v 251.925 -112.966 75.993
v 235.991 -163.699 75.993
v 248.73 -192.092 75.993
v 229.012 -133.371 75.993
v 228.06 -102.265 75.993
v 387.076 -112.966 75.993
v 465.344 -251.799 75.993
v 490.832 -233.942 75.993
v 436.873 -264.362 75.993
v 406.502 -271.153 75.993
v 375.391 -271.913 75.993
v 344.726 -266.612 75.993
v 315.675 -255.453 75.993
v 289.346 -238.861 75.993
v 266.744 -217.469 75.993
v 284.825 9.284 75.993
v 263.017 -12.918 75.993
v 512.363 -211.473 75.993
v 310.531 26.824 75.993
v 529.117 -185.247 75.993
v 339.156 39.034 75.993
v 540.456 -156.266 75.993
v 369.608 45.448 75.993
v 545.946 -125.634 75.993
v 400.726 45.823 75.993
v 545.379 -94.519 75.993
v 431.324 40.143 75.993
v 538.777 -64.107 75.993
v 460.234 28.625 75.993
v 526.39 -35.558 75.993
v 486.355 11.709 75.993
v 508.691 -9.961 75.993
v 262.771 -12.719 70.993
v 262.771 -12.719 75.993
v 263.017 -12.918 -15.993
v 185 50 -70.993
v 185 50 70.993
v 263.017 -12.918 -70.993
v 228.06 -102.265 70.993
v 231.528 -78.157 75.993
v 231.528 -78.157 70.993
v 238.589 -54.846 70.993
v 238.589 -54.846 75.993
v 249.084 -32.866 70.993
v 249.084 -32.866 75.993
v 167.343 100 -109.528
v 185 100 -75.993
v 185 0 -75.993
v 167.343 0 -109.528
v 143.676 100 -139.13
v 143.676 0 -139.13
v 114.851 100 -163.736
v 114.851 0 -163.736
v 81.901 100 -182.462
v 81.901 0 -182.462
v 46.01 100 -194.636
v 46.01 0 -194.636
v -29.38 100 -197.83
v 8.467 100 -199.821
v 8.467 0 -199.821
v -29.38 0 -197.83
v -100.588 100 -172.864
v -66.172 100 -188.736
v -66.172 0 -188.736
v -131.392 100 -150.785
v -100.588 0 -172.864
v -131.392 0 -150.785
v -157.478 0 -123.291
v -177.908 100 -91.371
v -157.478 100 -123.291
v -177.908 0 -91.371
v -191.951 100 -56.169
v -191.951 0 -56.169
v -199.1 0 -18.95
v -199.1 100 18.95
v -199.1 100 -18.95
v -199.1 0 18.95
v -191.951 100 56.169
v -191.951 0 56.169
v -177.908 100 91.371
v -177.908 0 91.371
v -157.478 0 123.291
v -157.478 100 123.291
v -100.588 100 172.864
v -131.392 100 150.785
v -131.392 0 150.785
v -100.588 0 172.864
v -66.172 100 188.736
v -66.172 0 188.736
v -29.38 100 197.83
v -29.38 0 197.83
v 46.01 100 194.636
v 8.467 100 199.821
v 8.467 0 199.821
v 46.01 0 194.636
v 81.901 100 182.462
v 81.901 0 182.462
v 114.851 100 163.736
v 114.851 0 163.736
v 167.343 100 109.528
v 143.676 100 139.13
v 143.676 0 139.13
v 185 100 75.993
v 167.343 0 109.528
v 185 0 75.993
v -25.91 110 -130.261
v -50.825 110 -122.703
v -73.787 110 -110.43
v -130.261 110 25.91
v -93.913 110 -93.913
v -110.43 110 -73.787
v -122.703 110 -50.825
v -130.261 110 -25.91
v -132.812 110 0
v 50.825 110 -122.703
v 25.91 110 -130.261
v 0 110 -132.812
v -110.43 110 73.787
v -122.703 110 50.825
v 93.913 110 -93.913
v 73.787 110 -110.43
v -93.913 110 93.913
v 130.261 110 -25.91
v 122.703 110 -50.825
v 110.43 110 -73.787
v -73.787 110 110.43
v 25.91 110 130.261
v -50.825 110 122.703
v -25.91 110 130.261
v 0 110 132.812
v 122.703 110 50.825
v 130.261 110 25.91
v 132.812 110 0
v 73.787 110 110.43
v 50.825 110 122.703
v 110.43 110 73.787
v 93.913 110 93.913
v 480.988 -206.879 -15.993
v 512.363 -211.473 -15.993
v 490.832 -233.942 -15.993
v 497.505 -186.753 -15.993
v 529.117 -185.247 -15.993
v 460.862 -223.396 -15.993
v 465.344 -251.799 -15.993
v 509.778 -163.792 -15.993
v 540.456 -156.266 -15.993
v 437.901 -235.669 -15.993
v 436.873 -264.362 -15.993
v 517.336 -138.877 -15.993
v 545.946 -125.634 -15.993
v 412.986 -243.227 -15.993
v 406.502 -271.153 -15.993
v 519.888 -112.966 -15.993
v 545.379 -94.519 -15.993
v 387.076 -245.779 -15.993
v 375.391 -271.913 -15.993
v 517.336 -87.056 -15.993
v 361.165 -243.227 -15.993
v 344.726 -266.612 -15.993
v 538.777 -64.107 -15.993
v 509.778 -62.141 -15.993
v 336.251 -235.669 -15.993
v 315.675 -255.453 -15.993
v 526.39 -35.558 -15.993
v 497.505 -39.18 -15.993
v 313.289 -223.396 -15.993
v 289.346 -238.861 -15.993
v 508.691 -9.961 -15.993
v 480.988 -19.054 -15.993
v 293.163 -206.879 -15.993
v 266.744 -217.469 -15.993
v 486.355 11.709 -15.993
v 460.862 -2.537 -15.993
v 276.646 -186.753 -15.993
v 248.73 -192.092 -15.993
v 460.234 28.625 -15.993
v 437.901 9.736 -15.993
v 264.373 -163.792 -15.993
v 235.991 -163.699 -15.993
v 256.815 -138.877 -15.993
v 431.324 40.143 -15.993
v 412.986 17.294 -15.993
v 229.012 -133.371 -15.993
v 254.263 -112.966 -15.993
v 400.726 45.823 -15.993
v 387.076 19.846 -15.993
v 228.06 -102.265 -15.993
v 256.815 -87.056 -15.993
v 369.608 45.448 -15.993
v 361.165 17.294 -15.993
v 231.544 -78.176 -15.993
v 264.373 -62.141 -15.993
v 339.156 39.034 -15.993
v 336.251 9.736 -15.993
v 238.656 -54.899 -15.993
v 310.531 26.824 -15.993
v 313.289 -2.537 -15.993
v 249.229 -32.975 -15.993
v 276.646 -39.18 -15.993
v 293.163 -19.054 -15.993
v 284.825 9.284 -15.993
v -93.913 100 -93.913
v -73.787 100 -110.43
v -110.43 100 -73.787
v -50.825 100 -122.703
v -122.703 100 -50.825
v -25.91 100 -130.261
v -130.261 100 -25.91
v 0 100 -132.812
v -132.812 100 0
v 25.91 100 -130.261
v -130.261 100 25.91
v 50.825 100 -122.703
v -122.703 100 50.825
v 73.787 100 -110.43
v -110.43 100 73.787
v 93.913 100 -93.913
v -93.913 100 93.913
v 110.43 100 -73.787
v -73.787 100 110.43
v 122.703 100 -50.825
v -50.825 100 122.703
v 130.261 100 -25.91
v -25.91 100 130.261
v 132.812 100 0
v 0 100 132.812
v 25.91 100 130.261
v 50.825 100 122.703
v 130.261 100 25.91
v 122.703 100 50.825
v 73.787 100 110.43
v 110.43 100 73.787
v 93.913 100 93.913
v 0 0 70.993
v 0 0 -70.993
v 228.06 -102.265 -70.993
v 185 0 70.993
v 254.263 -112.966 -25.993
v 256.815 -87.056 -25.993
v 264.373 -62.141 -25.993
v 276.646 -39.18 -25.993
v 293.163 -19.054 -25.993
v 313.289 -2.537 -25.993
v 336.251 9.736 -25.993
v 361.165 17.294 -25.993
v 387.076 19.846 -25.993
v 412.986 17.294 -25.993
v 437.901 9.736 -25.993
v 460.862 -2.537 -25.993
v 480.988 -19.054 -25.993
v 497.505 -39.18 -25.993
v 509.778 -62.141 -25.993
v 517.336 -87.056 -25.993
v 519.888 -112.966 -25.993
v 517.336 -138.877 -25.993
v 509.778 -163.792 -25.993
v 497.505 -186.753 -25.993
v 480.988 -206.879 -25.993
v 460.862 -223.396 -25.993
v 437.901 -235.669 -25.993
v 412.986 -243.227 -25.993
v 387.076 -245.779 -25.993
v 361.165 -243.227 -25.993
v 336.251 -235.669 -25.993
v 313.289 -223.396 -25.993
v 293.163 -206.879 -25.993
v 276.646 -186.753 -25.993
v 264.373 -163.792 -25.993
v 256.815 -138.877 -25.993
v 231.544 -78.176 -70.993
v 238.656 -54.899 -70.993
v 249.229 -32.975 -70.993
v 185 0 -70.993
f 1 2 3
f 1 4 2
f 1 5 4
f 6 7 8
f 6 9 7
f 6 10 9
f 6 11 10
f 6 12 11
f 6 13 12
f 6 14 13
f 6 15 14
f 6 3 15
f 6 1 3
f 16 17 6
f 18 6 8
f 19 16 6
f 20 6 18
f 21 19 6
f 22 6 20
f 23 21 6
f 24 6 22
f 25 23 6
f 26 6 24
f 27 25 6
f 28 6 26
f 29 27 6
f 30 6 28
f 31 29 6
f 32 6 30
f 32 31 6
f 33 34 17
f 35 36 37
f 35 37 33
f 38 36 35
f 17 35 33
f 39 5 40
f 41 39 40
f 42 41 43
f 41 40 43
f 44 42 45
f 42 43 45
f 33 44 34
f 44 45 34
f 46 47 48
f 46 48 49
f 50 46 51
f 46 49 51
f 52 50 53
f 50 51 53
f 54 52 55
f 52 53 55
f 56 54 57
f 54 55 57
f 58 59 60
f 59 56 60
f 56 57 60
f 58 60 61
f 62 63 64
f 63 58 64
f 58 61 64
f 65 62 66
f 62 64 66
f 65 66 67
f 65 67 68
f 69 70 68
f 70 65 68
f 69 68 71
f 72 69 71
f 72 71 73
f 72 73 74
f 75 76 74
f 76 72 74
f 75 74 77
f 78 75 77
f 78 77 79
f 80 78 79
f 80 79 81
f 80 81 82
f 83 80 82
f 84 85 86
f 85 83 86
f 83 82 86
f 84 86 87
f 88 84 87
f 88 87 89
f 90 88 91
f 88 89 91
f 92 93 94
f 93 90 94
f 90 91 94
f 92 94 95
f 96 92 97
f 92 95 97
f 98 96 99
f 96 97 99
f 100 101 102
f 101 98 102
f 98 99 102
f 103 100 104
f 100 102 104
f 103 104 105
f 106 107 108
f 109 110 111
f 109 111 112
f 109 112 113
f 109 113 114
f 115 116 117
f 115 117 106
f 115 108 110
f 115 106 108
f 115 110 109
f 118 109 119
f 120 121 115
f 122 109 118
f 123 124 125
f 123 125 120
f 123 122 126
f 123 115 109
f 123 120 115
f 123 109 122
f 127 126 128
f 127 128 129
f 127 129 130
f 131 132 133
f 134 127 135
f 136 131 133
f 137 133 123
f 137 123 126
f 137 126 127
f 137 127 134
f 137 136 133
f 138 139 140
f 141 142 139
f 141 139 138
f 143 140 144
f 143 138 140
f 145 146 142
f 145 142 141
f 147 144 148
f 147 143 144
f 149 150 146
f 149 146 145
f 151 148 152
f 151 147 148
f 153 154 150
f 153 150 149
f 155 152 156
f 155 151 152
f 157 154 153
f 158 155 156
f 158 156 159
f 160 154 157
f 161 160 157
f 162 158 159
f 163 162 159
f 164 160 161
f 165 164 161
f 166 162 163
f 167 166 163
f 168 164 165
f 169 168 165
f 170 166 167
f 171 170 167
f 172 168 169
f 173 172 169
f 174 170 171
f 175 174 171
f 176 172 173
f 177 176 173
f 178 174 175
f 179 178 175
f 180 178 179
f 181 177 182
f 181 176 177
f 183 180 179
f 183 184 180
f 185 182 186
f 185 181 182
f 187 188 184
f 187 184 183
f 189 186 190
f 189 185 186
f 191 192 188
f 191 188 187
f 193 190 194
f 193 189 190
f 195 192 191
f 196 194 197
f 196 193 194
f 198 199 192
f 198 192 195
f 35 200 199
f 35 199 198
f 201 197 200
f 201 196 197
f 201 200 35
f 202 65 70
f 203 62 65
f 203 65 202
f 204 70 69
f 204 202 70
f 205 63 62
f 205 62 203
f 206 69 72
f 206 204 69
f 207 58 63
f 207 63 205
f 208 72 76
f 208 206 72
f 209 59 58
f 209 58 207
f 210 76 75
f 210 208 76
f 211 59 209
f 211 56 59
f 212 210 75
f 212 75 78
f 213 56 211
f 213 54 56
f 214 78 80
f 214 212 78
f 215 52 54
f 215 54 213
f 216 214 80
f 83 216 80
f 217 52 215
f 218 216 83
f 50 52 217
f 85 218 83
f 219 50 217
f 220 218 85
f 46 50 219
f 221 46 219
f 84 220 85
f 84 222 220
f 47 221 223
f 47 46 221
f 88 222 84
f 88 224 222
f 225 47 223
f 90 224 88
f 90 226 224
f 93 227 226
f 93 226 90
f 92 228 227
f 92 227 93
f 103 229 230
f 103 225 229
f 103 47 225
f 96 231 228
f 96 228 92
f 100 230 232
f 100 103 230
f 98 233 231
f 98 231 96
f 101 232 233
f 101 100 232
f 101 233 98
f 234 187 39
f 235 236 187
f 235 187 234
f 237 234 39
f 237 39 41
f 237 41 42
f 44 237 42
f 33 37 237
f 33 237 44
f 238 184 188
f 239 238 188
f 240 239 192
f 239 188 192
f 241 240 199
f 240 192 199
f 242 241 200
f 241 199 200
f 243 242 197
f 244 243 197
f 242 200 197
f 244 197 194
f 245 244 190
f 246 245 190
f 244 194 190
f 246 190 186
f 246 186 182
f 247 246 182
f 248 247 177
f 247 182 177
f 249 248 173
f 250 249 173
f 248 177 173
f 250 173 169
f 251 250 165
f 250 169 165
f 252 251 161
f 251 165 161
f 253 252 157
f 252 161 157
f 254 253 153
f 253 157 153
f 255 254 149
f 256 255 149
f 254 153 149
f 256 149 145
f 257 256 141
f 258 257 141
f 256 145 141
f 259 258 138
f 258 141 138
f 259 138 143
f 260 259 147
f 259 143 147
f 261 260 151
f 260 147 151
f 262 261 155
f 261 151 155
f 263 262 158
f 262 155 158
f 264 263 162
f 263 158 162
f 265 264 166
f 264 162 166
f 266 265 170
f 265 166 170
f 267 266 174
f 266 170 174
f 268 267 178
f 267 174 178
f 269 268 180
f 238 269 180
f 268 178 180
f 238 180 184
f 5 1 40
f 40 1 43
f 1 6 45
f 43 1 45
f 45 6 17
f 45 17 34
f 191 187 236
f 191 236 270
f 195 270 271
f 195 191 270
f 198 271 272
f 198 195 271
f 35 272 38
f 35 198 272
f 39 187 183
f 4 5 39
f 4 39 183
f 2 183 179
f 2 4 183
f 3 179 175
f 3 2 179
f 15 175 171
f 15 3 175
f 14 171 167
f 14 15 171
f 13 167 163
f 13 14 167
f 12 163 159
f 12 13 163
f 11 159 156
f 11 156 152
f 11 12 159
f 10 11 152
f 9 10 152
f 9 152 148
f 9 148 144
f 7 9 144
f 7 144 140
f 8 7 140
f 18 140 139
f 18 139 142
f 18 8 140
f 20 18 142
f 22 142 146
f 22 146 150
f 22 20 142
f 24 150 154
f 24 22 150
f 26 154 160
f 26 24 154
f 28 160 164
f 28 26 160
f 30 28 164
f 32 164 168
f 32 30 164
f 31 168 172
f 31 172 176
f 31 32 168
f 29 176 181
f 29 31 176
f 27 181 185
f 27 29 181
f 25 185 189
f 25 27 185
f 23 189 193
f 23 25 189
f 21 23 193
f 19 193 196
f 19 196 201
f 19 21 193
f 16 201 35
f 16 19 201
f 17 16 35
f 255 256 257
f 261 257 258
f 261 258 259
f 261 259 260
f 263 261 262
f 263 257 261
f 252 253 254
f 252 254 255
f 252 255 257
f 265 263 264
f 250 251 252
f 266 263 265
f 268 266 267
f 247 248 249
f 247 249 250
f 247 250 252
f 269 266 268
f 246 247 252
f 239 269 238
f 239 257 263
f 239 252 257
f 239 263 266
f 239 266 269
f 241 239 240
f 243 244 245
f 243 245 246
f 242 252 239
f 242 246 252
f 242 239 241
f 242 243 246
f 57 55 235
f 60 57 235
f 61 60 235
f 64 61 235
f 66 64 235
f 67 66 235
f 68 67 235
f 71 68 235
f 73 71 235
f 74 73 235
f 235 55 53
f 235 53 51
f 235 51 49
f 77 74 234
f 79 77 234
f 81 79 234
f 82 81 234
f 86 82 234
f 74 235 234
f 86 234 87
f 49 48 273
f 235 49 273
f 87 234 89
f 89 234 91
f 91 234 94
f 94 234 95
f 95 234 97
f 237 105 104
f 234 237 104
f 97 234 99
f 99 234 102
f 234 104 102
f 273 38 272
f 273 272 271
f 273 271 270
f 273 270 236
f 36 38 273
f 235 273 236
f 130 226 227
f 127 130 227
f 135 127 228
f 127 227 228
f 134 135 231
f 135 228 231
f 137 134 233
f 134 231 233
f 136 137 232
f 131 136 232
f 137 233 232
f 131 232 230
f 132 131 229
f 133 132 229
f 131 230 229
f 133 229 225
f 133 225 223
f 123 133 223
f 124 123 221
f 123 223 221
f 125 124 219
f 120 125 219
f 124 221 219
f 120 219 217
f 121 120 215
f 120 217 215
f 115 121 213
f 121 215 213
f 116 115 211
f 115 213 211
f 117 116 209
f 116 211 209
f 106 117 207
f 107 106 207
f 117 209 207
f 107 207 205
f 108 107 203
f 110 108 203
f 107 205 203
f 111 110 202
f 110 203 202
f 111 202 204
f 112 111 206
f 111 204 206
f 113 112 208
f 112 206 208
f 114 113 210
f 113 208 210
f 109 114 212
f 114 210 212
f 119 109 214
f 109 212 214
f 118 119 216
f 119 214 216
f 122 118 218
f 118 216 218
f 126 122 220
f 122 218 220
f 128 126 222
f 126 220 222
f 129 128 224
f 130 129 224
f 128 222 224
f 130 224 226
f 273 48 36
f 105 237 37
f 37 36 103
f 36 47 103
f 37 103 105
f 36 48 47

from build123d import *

# Parameters (mm, degrees)
SKETCH1_R           = 200
BOSS_EXTRUDE1_DEPTH = 100
CUT_EXTRUDE2_DEPTH  = 100
BOSS_EXTRUDE2_DEPTH = 75.993421
BOSS_EXTRUDE3_DEPTH = 75.993421
SKETCH9_R           = 159.375
BOSS_EXTRUDE4_DEPTH = 151.986842
CUT_EXTRUDE3_START  = -60
SKETCH11_R          = 159.375
CUT_EXTRUDE3_DEPTH  = 60
CUT_EXTRUDE4_DEPTH  = 5
CUT_EXTRUDE5_DEPTH  = 5
SKETCH15_R          = 132.8125
BOSS_EXTRUDE5_DEPTH = 10
SKETCH16_R          = 132.8125
BOSS_EXTRUDE6_DEPTH = 10


with BuildPart() as part:
    # Sketch1 → Boss-Extrude1 (new body)
    with BuildSketch(Plane(origin=(0, 0, 0), x_dir=(1, 0, 0), z_dir=(0, 1, 0))):
        with Locations(Location((0, 0, 0), (0, 0, 270))):
            Circle(SKETCH1_R)
    extrude(amount=BOSS_EXTRUDE1_DEPTH)

    # Sketch2 → Cut-Extrude2 (cut)
    with BuildSketch(Plane(origin=(0, 100, 0), x_dir=(1, 0, 0), z_dir=(0, 1, 0))):
        Polygon((185, 0), (185, 120.642549135), (200, 120.642549135), (200, 0), (200, -137.849885779), (185, -137.849885779), align=None)
    extrude(amount=-CUT_EXTRUDE2_DEPTH, mode=Mode.SUBTRACT)

    # Sketch4 → Boss-Extrude2 (add)
    with BuildSketch(Plane.XY):
        Polygon((185, 50), (185, 0), (0, 0), (251.924557131, -112.966443103), (387.075695624, -112.966443103), align=None)
    extrude(amount=-BOSS_EXTRUDE2_DEPTH)

    # Sketch7 → Boss-Extrude3 (add)
    with BuildSketch(Plane.XY):
        Polygon((0, 0), (185, 0), (185, 50), (387.075695624, -112.966443103), (251.924557131, -112.966443103), align=None)
    extrude(amount=BOSS_EXTRUDE3_DEPTH)

    # Sketch9 → Boss-Extrude4 (add)
    with BuildSketch(Plane.XY.offset(75.993420768)):
        with Locations((387.075695624, -112.966443103)):
            Circle(SKETCH9_R)
    extrude(amount=-BOSS_EXTRUDE4_DEPTH)

    # Sketch11 → Cut-Extrude3 (cut)
    with BuildSketch(Plane(origin=(0, 0, -75.993420768), x_dir=(-1, 0, 0), z_dir=(0, 0, -1)).offset(CUT_EXTRUDE3_START)):
        with Locations((-387.075695624, -112.966443103)):
            Circle(SKETCH11_R)
    extrude(amount=CUT_EXTRUDE3_DEPTH, mode=Mode.SUBTRACT)


with BuildPart() as cut_extrude3_kept_piece:
    # of the separate pieces the step leaves, the one the design keeps (cut_extrude3_pieces_kept)
    add(part.part.solids().sort_by_distance((185, 0, -75.993420884))[0])

    # Sketch12 → Cut-Extrude4 (cut)
    with BuildSketch(Plane.XY.offset(75.993420768)):
        with BuildLine():
            Line((185, 0), (0, 0))
            Line((0, 0), (228.060355378, -102.265406172))
            ThreePointArc((228.060355378, -102.265406172), (238.589276077, -54.846272892), (262.770904395, -12.719307371))
            Line((262.770904395, -12.719307371), (185, 50))
            Line((185, 50), (185, 0))
        make_face()
    extrude(amount=-CUT_EXTRUDE4_DEPTH, mode=Mode.SUBTRACT)

    # Sketch14 → Cut-Extrude5 (cut)
    with BuildSketch(Plane(origin=(0, 0, -75.993420768), x_dir=(-1, 0, 0), z_dir=(0, 0, -1))):
        with BuildLine():
            Line((-228.060355378, -102.265406172), (0, 0))
            Line((0, 0), (-185, 0))
            Line((-185, 0), (-185, 50))
            Line((-185, 50), (-263.016769179, -12.917588066))
            ThreePointArc((-263.016769179, -12.917588066), (-238.655621962, -54.898617596), (-228.060355378, -102.265406172))
        make_face()
    extrude(amount=-CUT_EXTRUDE5_DEPTH, mode=Mode.SUBTRACT)

    # Sketch15 → Boss-Extrude5 (add)
    with BuildSketch(Plane(origin=(0, 0, -15.993420768), x_dir=(-1, 0, 0), z_dir=(0, 0, -1))):
        with Locations((-387.075695624, -112.966443103)):
            Circle(SKETCH15_R)
    extrude(amount=BOSS_EXTRUDE5_DEPTH)

    # Sketch16 → Boss-Extrude6 (add)
    with BuildSketch(Plane(origin=(0, 100, 0), x_dir=(1, 0, 0), z_dir=(0, 1, 0))):
        with Locations(Location((0, 0, 0), (0, 0, 270))):
            Circle(SKETCH16_R)
    extrude(amount=BOSS_EXTRUDE6_DEPTH)


solid = cut_extrude3_kept_piece.part
